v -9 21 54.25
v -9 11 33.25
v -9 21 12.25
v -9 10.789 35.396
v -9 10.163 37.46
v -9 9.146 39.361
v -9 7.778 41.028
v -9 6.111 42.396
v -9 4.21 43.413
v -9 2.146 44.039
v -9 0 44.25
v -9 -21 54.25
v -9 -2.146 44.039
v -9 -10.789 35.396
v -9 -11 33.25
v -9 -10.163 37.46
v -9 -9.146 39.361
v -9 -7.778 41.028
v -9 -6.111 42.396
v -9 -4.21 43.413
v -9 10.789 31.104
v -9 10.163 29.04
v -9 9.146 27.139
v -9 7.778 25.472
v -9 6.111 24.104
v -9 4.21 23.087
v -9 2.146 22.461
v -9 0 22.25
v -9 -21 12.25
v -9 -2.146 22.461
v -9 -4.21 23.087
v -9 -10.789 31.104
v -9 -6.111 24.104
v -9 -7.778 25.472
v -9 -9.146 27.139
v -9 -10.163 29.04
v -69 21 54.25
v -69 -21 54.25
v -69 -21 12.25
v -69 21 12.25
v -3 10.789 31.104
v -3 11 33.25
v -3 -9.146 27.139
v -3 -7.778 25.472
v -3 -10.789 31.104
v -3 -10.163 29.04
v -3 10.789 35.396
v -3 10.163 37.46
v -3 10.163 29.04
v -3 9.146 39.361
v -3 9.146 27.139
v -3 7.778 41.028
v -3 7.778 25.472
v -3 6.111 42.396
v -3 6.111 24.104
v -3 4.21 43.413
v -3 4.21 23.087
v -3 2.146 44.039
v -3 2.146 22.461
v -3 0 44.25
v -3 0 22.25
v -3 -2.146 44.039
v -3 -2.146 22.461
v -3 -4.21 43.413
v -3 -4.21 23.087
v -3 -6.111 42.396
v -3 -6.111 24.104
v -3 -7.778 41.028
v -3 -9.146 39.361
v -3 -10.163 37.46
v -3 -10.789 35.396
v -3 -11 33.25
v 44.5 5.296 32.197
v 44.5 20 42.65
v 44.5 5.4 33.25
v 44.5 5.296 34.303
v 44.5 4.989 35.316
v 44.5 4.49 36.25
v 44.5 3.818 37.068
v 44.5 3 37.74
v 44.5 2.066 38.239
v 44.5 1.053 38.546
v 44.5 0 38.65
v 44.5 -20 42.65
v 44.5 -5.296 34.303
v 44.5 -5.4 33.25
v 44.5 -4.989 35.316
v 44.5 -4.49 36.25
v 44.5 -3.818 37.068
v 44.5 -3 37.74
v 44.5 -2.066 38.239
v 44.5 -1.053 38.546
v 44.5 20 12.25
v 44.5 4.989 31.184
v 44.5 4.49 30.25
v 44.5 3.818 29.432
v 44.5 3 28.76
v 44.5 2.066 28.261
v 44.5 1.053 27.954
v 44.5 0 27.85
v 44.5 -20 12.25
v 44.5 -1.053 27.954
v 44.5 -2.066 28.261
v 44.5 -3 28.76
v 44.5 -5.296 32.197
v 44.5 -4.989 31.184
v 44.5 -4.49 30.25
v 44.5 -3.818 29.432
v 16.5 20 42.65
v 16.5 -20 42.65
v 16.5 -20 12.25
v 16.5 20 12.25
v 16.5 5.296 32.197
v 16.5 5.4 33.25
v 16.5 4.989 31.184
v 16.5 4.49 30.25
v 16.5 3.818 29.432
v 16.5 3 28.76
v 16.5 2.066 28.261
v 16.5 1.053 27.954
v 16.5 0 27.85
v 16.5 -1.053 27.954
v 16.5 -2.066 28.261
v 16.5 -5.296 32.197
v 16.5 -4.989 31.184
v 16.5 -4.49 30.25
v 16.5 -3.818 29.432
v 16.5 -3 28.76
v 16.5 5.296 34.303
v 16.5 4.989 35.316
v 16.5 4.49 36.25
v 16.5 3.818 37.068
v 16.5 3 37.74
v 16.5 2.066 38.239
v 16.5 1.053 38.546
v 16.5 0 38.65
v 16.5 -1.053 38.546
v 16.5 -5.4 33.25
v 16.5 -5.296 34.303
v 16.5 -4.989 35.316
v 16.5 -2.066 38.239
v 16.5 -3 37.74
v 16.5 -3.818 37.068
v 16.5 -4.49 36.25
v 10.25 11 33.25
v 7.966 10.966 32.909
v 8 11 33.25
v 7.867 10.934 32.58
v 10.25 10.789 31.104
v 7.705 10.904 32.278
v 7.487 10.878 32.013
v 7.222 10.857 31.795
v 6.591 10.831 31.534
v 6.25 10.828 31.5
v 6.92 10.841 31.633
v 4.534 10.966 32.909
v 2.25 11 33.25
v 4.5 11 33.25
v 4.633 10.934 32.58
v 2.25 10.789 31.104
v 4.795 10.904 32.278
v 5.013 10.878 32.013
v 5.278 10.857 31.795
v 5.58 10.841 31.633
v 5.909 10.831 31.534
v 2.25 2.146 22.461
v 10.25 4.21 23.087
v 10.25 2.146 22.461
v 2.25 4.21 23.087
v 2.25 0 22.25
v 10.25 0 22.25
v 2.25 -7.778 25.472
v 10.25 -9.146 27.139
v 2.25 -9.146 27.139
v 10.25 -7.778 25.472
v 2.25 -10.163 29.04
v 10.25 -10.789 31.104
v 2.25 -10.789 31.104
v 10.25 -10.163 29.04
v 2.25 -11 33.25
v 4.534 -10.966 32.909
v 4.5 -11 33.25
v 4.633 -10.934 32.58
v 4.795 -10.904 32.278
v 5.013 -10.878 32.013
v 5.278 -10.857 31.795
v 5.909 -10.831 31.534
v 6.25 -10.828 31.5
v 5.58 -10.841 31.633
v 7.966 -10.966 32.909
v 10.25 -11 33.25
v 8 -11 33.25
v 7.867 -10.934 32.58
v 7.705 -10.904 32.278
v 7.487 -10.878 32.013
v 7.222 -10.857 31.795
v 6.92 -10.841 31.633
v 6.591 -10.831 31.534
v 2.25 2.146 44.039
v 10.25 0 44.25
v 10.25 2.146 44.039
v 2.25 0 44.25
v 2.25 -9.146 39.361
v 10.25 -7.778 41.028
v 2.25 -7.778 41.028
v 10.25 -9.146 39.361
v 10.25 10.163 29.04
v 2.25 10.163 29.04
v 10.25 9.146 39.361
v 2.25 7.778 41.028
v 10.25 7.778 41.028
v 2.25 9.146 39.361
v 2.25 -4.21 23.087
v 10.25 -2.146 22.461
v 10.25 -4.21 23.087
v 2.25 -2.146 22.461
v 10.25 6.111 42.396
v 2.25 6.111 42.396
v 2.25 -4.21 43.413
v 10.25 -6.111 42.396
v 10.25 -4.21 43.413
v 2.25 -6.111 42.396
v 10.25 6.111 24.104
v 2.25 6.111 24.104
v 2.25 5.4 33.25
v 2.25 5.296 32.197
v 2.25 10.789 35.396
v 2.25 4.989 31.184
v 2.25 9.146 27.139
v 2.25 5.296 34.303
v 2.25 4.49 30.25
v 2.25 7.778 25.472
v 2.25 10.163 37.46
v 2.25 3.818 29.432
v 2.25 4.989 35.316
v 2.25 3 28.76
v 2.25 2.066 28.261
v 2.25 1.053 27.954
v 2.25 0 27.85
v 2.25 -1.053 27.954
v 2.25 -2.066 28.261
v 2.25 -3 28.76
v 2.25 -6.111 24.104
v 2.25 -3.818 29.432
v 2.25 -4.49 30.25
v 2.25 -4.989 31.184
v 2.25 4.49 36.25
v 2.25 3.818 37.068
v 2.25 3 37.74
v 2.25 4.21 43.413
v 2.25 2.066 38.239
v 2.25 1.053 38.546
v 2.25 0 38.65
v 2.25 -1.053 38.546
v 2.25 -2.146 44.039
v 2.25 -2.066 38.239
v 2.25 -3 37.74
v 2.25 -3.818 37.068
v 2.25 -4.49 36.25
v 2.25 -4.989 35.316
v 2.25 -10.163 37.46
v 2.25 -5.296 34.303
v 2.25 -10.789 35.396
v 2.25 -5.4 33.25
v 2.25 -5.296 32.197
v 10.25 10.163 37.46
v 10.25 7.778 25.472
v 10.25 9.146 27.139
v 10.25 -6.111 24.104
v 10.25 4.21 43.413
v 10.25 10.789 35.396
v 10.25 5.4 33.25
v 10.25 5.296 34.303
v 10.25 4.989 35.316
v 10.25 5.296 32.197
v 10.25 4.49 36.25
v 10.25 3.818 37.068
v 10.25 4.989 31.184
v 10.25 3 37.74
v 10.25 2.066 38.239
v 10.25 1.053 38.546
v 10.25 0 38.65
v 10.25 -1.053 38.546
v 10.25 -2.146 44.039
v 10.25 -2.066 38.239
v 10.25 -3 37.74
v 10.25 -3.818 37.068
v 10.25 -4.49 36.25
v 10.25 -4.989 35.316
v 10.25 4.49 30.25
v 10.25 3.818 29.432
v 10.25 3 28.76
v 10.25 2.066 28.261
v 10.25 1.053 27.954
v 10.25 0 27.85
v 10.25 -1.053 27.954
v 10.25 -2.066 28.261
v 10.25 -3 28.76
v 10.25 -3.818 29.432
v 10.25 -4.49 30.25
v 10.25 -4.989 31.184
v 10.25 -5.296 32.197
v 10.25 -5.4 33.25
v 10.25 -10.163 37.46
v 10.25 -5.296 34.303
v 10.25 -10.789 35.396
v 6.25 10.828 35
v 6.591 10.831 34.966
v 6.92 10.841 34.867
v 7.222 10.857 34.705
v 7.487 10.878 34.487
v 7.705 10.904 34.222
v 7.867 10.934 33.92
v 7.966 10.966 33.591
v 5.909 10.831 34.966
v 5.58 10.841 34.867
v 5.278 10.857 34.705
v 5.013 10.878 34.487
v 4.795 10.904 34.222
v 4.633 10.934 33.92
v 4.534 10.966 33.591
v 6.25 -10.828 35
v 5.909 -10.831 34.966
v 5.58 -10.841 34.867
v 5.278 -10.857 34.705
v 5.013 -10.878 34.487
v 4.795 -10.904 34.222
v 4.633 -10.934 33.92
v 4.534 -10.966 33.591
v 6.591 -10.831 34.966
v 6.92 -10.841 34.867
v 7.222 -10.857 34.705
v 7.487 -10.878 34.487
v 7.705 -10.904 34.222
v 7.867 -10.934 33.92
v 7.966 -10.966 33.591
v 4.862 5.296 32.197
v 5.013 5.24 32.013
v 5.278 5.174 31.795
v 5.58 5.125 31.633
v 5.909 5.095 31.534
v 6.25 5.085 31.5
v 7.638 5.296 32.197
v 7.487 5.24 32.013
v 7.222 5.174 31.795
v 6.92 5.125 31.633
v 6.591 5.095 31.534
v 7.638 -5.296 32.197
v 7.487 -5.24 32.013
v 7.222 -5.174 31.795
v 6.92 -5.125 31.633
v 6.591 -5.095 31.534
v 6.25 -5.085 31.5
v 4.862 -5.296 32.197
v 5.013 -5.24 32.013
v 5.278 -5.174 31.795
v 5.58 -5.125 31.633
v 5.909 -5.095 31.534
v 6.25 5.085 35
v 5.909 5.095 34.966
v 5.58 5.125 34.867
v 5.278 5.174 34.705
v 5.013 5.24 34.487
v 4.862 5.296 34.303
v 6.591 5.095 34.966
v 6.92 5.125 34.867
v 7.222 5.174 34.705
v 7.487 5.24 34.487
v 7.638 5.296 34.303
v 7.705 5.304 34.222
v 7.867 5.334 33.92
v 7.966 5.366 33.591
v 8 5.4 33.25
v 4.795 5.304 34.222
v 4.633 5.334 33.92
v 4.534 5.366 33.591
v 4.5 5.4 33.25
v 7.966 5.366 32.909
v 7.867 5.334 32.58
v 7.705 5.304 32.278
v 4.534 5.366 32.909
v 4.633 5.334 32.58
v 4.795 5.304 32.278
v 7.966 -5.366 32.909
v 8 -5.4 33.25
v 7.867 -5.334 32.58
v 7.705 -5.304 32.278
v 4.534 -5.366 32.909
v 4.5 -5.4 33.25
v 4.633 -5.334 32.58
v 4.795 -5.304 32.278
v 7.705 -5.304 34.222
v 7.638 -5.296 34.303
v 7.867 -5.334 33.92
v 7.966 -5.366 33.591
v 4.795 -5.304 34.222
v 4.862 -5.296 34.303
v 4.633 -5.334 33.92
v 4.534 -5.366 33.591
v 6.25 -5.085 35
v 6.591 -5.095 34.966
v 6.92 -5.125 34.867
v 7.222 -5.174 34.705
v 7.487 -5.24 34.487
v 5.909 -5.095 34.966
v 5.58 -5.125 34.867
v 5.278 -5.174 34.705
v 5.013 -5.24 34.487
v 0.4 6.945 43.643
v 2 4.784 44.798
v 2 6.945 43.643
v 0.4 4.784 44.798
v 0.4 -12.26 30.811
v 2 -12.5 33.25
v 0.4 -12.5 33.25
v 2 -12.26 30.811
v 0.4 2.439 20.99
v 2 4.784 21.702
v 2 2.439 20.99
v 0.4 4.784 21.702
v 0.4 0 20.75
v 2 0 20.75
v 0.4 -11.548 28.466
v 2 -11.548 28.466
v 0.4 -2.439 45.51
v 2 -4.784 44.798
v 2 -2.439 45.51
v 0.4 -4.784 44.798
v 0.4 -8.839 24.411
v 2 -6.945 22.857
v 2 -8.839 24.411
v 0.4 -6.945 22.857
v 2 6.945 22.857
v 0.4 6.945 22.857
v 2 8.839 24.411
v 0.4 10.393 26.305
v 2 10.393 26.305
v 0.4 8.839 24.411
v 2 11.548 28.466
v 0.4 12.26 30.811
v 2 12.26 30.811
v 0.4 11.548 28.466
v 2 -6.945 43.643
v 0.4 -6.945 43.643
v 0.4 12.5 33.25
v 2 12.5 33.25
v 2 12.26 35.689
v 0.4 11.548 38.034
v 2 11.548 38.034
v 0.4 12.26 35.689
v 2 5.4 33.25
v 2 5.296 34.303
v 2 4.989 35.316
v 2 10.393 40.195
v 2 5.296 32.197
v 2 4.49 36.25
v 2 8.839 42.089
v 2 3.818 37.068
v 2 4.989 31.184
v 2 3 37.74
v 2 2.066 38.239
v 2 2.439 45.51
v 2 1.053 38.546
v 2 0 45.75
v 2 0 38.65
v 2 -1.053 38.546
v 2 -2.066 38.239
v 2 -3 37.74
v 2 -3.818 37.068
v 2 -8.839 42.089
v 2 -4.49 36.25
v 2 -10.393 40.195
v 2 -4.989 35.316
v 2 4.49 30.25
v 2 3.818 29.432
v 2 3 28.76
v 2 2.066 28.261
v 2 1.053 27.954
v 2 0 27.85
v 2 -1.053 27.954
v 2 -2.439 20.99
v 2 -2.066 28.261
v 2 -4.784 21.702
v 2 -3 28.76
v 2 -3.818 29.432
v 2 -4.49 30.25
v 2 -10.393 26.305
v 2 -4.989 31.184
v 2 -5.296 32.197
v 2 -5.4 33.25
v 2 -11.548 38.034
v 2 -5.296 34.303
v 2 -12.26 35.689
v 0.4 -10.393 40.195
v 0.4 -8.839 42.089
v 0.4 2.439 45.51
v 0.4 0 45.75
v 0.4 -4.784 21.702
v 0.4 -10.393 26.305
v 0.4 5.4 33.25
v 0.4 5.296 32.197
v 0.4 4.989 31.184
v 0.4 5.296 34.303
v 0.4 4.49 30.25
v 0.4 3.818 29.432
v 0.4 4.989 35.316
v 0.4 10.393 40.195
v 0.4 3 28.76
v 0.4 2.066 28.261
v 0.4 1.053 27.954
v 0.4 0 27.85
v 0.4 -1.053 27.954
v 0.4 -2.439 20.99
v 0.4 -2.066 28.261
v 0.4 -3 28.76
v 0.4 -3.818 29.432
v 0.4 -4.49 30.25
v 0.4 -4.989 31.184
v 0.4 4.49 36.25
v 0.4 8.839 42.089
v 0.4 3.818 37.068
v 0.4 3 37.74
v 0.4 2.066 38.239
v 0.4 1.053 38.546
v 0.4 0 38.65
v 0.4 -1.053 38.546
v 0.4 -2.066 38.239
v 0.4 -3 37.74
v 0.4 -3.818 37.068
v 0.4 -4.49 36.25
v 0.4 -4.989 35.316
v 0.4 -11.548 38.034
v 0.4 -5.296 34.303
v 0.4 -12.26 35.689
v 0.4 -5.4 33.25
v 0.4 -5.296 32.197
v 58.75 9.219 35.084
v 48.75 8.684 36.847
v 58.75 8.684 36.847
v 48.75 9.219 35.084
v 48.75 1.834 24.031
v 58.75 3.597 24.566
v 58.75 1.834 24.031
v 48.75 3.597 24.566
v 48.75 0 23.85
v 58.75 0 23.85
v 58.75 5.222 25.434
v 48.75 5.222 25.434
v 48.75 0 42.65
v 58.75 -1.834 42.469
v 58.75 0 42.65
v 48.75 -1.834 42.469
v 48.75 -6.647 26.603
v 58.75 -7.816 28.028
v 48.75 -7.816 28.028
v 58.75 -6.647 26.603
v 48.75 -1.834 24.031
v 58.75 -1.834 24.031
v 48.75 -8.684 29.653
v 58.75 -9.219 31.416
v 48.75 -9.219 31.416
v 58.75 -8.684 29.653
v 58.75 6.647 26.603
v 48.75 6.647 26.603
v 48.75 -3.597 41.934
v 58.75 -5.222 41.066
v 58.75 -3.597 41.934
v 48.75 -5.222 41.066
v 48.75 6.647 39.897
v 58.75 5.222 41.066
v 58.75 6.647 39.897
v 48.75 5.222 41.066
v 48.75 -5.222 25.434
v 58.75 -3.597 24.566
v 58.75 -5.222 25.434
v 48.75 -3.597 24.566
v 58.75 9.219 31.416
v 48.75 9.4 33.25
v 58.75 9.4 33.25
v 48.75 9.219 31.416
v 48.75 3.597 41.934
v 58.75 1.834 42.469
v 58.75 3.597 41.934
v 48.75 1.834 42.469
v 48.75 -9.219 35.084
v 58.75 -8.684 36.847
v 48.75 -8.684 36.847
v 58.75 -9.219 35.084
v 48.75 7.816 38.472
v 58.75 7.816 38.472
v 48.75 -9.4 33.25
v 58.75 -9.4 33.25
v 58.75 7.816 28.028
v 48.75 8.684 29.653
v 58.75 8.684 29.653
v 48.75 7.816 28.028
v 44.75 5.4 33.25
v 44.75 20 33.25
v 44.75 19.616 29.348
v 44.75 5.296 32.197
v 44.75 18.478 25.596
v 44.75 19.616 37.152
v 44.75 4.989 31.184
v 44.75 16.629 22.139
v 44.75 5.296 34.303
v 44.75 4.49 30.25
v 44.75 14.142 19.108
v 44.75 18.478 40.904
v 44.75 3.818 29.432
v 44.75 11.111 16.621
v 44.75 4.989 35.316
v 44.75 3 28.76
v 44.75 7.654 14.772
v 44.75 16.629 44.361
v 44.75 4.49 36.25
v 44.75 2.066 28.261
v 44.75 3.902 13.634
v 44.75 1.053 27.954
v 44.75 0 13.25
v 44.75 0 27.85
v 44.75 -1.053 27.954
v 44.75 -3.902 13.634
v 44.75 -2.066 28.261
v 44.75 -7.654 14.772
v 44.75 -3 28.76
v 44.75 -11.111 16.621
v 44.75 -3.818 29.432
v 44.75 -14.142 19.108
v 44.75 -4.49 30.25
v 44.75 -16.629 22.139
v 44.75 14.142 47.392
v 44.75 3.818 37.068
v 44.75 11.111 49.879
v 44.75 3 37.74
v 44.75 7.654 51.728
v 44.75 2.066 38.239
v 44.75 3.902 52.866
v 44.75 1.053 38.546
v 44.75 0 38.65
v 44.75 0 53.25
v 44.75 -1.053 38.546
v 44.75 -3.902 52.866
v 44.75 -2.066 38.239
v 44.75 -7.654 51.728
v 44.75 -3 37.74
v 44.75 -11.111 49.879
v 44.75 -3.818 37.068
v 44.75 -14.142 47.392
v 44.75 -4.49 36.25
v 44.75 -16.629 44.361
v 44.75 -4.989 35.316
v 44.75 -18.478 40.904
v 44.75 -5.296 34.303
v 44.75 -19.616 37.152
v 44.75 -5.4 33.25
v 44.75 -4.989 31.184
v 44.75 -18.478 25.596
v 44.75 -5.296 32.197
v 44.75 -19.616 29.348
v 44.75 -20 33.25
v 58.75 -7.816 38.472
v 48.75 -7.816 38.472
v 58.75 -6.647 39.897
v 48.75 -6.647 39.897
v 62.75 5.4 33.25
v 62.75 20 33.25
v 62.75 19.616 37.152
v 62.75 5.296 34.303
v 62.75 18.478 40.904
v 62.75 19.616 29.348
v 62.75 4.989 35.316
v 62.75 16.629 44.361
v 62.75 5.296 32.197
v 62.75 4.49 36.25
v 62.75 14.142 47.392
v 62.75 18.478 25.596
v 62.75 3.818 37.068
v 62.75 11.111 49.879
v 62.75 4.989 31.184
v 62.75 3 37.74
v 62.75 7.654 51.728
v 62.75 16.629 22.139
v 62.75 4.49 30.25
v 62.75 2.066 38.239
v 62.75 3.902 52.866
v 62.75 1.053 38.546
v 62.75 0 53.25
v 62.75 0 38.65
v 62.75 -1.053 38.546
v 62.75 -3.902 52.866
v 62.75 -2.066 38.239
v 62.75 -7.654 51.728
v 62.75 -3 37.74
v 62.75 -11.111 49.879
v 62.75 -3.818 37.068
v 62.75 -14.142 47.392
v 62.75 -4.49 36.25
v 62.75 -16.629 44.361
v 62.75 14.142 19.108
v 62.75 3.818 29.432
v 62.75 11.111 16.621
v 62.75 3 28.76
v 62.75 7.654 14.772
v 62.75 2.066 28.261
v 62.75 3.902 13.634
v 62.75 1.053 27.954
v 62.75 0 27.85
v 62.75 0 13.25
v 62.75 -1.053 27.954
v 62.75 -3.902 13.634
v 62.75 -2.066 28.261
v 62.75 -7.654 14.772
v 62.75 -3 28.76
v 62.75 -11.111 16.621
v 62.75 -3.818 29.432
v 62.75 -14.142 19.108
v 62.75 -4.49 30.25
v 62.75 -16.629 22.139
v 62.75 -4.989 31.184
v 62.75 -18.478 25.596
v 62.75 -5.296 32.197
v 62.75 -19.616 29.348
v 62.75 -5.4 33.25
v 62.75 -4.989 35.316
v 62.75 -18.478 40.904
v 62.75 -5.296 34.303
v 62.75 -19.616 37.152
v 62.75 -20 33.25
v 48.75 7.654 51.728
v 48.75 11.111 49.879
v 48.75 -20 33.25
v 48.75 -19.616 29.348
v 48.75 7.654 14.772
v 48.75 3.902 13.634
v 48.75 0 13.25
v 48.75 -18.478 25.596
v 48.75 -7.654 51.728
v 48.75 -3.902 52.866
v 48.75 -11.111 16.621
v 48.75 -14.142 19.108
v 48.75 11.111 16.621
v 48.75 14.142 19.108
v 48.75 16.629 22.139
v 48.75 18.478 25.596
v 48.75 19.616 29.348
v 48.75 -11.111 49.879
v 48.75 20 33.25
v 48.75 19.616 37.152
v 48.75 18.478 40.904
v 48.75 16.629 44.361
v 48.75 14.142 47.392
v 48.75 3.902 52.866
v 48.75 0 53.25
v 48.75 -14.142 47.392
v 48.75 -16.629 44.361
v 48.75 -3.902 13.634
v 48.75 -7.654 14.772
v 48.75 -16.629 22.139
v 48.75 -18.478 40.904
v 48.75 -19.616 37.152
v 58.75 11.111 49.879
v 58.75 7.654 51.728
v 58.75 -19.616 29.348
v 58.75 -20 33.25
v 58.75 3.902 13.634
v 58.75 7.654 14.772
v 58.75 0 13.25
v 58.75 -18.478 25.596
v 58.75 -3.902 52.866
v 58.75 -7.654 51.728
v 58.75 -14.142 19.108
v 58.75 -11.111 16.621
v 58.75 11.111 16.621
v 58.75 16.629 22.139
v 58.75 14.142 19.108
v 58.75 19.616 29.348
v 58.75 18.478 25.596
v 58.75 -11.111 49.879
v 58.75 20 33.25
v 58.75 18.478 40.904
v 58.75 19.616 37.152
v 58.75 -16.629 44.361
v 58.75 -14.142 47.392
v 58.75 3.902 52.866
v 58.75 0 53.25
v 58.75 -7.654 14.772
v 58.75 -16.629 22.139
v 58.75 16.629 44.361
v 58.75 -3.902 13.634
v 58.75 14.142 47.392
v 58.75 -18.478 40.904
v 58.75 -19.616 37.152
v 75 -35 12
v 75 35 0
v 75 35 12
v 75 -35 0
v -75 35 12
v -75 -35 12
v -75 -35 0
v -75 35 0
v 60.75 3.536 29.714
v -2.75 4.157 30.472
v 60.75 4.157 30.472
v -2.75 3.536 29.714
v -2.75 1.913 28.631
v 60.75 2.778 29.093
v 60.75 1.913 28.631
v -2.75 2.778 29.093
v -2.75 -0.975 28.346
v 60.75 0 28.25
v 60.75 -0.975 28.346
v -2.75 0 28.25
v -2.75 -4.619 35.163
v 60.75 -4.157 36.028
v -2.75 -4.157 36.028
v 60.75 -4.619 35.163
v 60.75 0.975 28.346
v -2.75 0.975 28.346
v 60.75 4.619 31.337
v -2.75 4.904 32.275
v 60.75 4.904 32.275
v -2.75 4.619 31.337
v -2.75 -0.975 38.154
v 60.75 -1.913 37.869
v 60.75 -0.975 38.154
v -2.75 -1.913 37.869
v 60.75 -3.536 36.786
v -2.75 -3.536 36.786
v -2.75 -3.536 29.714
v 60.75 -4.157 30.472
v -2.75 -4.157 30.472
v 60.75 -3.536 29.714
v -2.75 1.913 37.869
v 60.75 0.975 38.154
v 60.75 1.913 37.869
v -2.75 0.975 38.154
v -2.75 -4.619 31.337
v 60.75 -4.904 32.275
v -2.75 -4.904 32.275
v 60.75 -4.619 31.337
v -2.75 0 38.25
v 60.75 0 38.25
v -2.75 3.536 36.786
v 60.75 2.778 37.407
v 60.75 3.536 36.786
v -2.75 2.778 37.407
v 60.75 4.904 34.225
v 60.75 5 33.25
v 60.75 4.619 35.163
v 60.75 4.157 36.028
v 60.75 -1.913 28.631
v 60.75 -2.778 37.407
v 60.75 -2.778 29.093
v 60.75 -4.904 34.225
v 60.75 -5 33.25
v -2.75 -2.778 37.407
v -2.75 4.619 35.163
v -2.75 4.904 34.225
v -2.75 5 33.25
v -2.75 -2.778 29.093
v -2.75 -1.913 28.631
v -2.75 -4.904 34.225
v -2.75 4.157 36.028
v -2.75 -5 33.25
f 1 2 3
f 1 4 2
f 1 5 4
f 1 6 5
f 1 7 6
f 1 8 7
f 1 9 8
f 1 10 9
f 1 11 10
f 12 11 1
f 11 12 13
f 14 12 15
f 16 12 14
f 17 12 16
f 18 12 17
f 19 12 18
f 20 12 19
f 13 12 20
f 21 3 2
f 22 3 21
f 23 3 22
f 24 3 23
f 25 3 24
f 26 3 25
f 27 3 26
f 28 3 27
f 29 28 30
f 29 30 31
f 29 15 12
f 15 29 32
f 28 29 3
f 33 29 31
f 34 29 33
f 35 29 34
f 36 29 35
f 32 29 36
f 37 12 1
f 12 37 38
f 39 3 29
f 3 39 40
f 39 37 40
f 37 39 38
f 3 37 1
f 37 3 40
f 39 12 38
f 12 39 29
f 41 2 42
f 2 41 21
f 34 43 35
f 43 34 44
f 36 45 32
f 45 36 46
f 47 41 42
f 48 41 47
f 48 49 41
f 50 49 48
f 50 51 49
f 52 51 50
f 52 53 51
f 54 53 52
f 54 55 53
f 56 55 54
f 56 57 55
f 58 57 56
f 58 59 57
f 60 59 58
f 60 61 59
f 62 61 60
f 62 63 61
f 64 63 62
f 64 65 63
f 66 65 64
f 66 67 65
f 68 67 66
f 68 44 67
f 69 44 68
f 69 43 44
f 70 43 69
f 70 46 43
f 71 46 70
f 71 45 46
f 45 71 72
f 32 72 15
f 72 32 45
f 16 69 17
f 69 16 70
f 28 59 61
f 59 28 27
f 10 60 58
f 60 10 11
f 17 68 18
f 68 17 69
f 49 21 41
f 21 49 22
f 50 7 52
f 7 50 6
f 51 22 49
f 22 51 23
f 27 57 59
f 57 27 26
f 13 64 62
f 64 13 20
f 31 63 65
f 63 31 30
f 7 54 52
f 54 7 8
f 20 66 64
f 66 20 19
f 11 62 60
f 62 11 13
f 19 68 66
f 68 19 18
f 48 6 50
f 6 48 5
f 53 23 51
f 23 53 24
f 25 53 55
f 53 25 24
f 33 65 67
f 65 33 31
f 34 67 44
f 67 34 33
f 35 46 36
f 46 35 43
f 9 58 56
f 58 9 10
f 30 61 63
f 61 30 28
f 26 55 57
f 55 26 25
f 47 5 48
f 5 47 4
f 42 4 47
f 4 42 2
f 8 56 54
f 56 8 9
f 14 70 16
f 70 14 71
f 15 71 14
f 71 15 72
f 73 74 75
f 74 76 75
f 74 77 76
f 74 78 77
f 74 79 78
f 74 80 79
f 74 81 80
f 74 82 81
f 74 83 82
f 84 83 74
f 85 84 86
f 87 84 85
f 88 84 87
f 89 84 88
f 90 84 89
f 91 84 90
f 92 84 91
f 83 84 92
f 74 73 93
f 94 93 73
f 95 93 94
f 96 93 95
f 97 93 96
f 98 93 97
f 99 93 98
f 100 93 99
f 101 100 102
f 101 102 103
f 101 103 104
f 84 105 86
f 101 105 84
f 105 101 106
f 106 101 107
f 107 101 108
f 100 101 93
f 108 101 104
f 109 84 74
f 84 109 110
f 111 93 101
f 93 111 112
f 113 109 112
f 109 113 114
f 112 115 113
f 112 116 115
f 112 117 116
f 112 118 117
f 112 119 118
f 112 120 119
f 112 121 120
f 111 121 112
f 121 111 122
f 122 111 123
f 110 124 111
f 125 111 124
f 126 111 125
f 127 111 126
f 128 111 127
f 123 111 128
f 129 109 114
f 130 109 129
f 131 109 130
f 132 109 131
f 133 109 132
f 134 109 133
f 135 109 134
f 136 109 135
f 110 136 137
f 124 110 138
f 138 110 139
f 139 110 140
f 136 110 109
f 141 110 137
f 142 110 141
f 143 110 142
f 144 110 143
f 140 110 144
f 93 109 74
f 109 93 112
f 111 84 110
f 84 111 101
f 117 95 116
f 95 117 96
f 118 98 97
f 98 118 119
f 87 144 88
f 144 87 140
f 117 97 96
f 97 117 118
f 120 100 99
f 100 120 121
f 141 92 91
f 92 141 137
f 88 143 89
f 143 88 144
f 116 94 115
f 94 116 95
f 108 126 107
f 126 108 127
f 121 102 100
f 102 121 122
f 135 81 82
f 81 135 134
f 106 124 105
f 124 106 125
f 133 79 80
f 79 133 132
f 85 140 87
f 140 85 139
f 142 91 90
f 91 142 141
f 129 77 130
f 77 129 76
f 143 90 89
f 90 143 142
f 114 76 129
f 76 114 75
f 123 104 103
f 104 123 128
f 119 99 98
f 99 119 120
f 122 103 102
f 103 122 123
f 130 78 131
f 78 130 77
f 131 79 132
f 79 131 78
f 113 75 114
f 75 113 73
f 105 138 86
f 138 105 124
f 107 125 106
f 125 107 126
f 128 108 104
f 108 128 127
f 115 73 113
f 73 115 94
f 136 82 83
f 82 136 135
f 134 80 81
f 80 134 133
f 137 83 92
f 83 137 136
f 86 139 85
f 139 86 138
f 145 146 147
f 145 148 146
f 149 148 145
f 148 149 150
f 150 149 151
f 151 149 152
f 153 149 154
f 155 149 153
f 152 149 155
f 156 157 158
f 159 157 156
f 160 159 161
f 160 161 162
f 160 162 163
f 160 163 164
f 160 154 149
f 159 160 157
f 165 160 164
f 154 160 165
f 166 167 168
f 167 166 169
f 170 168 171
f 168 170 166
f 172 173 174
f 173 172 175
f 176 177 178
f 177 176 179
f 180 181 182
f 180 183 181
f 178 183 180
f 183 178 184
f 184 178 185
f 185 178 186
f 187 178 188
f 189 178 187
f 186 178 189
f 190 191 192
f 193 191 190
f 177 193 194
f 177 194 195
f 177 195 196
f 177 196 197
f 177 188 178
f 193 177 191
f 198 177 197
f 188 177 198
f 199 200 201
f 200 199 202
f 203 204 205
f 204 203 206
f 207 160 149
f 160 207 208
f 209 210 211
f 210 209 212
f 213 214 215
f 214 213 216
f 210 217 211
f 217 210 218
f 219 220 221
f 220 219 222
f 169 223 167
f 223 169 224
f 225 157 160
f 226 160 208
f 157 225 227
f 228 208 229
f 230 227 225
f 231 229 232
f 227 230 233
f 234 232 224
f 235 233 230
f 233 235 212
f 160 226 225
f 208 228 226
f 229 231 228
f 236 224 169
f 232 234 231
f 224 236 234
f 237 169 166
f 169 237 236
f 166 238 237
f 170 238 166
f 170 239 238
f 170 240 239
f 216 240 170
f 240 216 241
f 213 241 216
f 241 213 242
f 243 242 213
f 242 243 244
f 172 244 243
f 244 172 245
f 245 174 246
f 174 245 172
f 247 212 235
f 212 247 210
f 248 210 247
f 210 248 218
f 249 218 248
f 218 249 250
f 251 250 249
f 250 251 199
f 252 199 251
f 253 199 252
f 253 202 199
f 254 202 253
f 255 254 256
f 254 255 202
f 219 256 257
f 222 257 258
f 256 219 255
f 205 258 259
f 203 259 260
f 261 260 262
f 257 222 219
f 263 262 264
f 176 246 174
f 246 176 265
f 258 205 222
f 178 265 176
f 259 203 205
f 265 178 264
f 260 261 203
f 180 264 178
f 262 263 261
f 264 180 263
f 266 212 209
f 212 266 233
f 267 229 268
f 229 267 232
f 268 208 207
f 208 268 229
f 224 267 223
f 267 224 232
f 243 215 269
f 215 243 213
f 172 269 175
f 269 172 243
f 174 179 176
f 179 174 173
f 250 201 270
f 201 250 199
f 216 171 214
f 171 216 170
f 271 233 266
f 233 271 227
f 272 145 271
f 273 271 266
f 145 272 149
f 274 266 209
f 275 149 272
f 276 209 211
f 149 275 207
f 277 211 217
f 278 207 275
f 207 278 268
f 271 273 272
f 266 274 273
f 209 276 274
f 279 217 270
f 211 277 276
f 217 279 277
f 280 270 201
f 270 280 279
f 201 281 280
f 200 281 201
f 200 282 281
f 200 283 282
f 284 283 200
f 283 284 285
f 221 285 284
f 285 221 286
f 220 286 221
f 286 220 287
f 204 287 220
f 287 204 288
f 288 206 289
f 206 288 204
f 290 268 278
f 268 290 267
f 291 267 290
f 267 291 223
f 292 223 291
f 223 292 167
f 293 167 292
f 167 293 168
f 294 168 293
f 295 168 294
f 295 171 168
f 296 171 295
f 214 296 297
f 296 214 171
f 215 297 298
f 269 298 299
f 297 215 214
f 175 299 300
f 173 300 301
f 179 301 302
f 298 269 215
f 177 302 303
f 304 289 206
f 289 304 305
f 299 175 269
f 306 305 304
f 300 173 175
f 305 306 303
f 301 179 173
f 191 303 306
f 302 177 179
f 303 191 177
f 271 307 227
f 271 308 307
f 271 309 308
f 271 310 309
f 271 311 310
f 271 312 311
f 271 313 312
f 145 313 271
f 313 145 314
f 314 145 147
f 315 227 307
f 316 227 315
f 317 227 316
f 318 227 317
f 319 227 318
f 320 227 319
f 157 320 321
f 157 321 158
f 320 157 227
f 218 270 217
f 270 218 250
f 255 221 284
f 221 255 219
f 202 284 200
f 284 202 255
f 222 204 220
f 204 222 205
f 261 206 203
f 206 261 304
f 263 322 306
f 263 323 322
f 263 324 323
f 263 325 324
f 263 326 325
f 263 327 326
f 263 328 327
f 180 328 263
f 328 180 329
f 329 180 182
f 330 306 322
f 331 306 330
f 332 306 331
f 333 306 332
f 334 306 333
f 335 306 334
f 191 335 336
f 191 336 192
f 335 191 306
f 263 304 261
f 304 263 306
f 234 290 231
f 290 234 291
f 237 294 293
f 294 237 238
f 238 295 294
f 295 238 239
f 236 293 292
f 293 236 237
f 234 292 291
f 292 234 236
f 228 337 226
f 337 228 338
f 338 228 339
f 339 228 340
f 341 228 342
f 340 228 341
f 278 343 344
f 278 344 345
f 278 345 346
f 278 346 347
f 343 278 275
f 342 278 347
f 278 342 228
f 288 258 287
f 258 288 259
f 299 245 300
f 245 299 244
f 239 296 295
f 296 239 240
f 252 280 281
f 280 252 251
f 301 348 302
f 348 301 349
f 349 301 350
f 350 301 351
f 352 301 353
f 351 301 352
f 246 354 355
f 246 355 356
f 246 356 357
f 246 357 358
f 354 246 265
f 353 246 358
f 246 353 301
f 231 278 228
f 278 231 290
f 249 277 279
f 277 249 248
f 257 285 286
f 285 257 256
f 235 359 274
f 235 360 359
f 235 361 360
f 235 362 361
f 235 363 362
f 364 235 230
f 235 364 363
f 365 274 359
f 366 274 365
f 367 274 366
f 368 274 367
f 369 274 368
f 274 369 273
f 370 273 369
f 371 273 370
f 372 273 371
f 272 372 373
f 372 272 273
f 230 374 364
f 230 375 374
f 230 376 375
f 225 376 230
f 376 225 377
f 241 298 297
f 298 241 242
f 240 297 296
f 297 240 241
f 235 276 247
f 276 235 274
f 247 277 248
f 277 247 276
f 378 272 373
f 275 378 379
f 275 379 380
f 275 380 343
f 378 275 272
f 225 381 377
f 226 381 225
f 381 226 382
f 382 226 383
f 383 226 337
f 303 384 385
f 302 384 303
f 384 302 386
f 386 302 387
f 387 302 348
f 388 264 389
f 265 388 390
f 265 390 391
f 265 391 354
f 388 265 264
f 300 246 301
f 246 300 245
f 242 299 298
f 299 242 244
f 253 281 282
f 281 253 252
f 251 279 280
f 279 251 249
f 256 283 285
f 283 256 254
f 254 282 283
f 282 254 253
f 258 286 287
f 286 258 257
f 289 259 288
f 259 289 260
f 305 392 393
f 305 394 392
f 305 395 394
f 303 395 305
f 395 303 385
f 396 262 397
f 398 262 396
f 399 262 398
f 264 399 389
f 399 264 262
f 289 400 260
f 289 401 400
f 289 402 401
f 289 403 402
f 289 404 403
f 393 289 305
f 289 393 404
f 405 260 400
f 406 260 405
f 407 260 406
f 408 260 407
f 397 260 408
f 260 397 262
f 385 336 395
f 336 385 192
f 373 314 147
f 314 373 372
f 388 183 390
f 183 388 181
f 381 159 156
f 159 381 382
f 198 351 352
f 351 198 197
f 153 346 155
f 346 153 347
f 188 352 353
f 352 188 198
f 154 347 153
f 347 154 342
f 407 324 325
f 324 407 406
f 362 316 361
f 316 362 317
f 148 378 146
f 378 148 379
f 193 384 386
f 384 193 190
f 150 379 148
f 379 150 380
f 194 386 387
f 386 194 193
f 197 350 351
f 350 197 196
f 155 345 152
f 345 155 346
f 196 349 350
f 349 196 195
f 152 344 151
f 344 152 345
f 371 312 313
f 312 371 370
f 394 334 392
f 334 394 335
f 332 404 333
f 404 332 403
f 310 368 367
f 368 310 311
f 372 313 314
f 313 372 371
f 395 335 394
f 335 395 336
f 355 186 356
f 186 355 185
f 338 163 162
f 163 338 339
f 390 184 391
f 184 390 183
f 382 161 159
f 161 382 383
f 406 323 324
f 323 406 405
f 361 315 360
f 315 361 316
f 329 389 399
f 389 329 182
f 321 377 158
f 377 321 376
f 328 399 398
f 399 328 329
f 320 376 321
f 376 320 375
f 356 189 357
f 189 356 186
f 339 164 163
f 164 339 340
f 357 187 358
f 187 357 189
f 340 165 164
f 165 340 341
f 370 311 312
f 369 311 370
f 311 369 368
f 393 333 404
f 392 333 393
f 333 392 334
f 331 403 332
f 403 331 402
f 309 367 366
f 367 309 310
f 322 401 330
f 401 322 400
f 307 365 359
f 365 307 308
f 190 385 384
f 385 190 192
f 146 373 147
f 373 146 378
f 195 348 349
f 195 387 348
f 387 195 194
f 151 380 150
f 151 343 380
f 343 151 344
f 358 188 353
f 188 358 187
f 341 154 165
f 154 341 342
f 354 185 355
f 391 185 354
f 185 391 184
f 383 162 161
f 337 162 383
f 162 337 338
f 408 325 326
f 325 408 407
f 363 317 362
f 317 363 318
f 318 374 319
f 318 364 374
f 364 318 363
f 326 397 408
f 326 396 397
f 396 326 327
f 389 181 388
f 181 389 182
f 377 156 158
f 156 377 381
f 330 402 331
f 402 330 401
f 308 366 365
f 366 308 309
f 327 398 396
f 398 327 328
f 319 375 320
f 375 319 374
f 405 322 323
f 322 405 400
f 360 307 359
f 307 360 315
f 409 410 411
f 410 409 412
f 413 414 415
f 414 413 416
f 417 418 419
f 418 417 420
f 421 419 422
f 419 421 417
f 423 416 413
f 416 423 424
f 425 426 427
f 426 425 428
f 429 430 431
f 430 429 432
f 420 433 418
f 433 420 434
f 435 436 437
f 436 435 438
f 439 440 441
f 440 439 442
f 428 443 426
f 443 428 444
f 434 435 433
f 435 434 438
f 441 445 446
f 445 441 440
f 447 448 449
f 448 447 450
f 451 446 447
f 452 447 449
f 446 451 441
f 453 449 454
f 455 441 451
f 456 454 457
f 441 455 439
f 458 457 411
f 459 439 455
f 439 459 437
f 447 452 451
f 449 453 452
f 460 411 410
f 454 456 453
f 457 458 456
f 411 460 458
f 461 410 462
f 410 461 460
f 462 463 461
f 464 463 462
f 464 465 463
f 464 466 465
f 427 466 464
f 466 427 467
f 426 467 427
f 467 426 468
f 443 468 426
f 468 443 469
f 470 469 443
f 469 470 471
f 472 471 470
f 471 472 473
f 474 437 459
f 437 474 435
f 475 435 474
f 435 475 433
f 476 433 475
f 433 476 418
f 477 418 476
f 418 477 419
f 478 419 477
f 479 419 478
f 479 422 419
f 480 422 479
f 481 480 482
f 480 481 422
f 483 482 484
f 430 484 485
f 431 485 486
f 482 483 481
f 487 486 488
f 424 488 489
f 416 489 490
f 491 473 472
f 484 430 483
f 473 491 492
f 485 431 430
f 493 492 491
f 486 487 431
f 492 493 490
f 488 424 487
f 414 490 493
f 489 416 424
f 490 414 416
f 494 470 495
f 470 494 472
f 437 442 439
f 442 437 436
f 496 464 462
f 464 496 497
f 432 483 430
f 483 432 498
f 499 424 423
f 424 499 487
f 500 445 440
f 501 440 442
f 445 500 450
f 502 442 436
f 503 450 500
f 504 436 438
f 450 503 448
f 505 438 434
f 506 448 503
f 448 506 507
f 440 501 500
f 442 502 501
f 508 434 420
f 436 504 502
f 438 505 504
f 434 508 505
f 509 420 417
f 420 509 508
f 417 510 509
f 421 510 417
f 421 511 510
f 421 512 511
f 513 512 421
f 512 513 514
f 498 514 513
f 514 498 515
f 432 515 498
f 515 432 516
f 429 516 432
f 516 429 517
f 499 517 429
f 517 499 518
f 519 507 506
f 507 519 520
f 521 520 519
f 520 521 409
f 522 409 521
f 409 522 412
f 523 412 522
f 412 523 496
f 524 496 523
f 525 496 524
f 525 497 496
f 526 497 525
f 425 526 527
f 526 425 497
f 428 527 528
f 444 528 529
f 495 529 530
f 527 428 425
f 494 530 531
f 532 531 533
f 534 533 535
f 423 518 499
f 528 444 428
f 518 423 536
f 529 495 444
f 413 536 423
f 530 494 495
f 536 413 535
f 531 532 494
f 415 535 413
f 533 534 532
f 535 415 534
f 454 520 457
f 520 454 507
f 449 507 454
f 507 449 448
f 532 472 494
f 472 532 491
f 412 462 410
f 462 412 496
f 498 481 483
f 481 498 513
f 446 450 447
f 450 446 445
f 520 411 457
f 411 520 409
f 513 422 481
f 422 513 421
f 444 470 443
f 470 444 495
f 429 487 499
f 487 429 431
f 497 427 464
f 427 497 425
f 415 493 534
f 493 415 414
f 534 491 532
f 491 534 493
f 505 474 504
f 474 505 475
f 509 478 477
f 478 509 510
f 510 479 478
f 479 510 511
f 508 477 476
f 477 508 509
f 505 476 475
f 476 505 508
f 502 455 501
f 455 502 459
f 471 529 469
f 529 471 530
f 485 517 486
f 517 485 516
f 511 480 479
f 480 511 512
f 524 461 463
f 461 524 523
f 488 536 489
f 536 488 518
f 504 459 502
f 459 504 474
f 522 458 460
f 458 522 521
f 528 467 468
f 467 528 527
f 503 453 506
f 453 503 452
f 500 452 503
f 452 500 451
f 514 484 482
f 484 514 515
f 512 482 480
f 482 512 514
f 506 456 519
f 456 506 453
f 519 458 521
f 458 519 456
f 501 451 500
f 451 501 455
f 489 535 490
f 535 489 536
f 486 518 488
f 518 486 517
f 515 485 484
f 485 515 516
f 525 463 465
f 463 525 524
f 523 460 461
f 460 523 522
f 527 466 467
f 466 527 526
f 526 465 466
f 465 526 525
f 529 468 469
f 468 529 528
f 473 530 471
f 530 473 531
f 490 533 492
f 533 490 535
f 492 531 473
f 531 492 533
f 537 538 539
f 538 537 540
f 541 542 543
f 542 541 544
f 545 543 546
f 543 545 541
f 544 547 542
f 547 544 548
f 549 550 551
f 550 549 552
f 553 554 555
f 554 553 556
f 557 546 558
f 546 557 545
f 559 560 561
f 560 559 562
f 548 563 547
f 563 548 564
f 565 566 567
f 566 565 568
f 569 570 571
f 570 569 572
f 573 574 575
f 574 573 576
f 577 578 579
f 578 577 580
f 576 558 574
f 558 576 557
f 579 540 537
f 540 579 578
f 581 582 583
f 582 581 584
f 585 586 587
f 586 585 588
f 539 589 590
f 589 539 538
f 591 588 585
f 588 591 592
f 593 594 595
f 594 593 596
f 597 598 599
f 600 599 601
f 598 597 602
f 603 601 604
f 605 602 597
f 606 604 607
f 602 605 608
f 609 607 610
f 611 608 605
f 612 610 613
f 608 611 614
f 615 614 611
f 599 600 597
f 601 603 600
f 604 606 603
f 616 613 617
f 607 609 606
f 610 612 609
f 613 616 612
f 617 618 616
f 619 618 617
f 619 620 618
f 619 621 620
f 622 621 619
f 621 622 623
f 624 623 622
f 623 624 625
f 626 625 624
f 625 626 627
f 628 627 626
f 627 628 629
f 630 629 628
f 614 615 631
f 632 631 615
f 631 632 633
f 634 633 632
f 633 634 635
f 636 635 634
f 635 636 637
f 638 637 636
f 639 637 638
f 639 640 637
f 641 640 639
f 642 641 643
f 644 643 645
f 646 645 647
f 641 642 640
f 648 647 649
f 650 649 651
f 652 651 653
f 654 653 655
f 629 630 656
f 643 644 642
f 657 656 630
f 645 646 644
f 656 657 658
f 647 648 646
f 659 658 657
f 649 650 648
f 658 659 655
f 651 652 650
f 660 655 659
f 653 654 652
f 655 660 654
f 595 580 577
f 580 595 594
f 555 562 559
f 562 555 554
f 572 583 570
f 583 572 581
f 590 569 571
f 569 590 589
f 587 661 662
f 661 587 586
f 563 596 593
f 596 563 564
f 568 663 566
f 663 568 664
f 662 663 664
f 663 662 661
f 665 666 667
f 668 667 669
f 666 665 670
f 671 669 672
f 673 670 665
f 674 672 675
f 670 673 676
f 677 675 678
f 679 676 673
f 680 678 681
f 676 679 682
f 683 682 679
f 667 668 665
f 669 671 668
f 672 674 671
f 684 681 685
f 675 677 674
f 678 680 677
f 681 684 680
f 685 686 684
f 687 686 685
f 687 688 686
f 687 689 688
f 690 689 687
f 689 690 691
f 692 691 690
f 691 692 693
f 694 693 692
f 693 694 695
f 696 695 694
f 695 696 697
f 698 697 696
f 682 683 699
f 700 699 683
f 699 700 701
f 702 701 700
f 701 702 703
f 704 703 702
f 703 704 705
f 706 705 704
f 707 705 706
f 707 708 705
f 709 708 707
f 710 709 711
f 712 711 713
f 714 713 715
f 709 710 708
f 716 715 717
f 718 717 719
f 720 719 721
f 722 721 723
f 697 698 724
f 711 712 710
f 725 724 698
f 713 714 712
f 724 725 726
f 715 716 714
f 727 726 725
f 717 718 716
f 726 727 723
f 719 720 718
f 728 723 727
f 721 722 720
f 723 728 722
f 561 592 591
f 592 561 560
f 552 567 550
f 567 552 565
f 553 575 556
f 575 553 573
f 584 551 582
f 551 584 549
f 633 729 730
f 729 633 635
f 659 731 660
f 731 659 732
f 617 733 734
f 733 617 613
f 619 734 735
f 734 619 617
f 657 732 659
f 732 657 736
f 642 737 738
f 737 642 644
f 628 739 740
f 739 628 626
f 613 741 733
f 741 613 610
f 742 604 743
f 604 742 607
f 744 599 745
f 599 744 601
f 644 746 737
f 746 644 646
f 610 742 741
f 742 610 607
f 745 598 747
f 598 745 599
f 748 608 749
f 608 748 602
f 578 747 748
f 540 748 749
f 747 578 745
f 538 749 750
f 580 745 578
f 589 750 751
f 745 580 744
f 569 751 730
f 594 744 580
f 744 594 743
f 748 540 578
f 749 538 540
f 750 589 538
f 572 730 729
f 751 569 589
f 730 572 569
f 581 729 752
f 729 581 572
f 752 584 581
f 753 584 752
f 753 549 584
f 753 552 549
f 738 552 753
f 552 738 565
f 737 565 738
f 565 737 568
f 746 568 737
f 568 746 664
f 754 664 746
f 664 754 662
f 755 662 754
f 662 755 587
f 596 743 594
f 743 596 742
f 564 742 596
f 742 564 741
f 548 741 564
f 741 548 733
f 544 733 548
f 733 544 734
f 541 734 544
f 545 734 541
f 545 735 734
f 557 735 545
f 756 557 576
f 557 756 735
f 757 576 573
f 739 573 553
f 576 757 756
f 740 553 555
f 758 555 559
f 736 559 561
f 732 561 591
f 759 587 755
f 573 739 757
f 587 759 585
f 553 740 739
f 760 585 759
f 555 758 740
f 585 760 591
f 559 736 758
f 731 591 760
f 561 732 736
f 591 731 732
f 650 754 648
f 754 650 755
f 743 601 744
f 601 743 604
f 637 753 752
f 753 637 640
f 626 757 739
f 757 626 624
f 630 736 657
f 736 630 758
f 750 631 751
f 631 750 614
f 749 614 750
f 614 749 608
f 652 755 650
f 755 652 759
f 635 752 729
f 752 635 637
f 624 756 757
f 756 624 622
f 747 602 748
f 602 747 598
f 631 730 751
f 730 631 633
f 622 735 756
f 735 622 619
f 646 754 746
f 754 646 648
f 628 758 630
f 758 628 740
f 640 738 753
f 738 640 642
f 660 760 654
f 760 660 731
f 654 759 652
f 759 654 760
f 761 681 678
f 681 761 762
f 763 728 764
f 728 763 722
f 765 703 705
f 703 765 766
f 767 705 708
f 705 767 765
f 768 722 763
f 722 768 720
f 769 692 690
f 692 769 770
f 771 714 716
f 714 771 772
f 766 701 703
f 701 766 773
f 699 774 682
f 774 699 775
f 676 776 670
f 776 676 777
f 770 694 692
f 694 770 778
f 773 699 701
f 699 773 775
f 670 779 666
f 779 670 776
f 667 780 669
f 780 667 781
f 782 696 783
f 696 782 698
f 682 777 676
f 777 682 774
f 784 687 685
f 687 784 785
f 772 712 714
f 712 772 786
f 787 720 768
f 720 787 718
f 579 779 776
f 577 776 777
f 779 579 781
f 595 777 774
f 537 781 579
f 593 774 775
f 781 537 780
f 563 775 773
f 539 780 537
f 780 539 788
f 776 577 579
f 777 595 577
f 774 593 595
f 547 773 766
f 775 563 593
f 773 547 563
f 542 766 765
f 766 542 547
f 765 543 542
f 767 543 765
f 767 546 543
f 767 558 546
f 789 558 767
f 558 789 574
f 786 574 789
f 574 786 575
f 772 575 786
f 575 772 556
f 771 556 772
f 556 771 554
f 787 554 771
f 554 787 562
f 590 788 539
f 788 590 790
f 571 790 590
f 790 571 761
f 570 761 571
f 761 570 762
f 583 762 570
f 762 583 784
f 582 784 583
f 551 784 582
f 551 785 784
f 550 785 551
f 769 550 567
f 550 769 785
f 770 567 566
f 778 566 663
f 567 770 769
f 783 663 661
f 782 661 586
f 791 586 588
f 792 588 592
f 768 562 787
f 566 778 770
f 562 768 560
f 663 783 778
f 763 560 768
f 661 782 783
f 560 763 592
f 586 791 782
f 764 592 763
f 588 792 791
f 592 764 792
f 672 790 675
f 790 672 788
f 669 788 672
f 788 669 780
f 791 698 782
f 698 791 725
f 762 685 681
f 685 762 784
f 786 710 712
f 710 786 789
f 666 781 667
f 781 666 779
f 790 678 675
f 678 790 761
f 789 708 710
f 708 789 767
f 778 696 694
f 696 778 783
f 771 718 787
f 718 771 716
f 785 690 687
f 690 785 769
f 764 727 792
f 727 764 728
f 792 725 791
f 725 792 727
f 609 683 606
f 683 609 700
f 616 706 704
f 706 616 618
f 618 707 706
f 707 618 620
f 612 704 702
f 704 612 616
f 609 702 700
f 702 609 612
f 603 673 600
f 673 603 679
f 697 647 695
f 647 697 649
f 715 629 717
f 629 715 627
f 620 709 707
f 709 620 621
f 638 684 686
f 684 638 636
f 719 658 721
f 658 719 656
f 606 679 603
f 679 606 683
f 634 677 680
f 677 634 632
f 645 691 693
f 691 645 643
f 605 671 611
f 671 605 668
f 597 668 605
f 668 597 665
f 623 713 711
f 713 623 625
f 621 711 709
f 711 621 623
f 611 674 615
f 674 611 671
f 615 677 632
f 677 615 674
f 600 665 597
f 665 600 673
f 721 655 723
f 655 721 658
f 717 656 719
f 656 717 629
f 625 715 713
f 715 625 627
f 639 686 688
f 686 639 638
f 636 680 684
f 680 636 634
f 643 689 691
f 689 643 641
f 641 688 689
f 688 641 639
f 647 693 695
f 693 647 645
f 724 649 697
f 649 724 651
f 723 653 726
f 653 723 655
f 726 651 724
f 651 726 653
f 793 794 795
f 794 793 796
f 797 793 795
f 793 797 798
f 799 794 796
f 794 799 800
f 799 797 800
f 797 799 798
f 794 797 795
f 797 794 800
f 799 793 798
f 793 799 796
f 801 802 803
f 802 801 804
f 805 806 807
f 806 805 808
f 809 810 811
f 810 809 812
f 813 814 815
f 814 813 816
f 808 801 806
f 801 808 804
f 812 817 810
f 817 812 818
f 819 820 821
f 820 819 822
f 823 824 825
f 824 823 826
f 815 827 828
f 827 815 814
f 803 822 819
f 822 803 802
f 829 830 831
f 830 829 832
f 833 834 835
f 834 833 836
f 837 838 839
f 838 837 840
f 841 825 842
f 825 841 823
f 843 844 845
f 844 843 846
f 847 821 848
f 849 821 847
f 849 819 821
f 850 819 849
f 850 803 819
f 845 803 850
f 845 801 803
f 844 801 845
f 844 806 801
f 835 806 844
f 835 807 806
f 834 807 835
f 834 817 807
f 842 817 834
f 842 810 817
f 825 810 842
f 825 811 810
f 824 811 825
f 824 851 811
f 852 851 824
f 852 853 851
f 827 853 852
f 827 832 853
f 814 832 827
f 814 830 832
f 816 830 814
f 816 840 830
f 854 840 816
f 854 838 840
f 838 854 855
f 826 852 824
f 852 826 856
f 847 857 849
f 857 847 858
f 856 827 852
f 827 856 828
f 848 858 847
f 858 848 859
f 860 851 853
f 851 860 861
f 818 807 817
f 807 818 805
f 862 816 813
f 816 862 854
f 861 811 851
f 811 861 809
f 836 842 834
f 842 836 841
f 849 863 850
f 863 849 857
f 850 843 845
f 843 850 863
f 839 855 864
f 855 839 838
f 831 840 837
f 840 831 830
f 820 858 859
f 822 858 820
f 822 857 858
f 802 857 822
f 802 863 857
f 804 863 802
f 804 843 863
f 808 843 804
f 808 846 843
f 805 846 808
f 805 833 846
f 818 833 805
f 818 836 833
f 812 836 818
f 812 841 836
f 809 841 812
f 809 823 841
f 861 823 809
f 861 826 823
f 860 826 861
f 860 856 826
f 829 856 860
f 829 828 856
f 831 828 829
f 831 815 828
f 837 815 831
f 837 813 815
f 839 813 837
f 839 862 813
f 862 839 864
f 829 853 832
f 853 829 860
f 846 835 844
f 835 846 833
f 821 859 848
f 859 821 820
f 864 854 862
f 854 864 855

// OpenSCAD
$fn = 32;

// ------------------------------------------------------------------------
// Motor drive station: motor 60 x 42 mm, shaft d10, pulley d40
// Every part is its own module, assembly() places every instance.
// ------------------------------------------------------------------------

// --- part 1 ---
module station_bed() {
  difference() {
    translate([-75, -35, 0]) cube([150, 70, 12]);
  }
}

// --- part 2 ---
module drive_motor() {
  union() {
    translate([-30, -21, 0]) cube([60, 42, 42]);
    translate([33, 0, 21]) rotate([0, 90, 0]) cylinder(h = 6, d = 22, center = true);
  }
}

// --- part 3 ---
module pillow_block() {
  difference() {
    translate([-14, -20, 0]) cube([28, 40, 30.4]);
    translate([0, 0, 21]) rotate([0, 90, 0]) cylinder(h = 30, d = 10.8, center = true);
  }
}

// --- part 4 ---
module drive_shaft() {
  translate([0, 0, -31.75]) cylinder(h = 63.5, d = 10);
}

// --- part 5 ---
module shaft_collar() {
  difference() {
    cylinder(h = 8, d = 22);
    translate([0, 0, -1]) cylinder(h = 10, d = 10.8);
    translate([0, 0, 4]) rotate([90, 0, 0]) cylinder(h = 24, d = 3.5, center = true);
  }
}

// --- part 6 ---
module collar_washer() {
  difference() {
      translate([0, 0, 0]) cylinder(h = 1.6, d = 25);
      translate([0, 0, -1]) cylinder(h = 3.6, d = 10.8);
    }
}

// --- part 7 ---
module drive_pulley() {
  difference() {
    union() {
      cylinder(h = 18, d = 18.8);
      cylinder(h = 4, d = 40);
      translate([0, 0, 14]) cylinder(h = 4, d = 40);
    }
    translate([0, 0, -1]) cylinder(h = 20, d = 10.8);
  }
}

// --- assembly ---
module assembly() {
  color([0.80, 0.24, 0.20]) translate([0, 0, 0]) rotate([0, 0, 0]) station_bed();
  color([0.20, 0.45, 0.75]) translate([-39, 0, 12.25]) rotate([0, 0, 0]) drive_motor();
  color([0.25, 0.62, 0.32]) translate([30.5, 0, 12.25]) rotate([0, 0, 0]) pillow_block();
  color([0.92, 0.70, 0.18]) translate([29, 0, 33.25]) rotate([0, 90, 0]) drive_shaft();
  color([0.58, 0.35, 0.70]) translate([2.25, 0, 33.25]) rotate([0, 90, 0]) shaft_collar();
  color([0.16, 0.66, 0.66]) translate([0.4, 0, 33.25]) rotate([0, 90, 0]) collar_washer();
  color([0.85, 0.48, 0.18]) translate([44.75, 0, 33.25]) rotate([0, 90, 0]) drive_pulley();
}

assembly();
